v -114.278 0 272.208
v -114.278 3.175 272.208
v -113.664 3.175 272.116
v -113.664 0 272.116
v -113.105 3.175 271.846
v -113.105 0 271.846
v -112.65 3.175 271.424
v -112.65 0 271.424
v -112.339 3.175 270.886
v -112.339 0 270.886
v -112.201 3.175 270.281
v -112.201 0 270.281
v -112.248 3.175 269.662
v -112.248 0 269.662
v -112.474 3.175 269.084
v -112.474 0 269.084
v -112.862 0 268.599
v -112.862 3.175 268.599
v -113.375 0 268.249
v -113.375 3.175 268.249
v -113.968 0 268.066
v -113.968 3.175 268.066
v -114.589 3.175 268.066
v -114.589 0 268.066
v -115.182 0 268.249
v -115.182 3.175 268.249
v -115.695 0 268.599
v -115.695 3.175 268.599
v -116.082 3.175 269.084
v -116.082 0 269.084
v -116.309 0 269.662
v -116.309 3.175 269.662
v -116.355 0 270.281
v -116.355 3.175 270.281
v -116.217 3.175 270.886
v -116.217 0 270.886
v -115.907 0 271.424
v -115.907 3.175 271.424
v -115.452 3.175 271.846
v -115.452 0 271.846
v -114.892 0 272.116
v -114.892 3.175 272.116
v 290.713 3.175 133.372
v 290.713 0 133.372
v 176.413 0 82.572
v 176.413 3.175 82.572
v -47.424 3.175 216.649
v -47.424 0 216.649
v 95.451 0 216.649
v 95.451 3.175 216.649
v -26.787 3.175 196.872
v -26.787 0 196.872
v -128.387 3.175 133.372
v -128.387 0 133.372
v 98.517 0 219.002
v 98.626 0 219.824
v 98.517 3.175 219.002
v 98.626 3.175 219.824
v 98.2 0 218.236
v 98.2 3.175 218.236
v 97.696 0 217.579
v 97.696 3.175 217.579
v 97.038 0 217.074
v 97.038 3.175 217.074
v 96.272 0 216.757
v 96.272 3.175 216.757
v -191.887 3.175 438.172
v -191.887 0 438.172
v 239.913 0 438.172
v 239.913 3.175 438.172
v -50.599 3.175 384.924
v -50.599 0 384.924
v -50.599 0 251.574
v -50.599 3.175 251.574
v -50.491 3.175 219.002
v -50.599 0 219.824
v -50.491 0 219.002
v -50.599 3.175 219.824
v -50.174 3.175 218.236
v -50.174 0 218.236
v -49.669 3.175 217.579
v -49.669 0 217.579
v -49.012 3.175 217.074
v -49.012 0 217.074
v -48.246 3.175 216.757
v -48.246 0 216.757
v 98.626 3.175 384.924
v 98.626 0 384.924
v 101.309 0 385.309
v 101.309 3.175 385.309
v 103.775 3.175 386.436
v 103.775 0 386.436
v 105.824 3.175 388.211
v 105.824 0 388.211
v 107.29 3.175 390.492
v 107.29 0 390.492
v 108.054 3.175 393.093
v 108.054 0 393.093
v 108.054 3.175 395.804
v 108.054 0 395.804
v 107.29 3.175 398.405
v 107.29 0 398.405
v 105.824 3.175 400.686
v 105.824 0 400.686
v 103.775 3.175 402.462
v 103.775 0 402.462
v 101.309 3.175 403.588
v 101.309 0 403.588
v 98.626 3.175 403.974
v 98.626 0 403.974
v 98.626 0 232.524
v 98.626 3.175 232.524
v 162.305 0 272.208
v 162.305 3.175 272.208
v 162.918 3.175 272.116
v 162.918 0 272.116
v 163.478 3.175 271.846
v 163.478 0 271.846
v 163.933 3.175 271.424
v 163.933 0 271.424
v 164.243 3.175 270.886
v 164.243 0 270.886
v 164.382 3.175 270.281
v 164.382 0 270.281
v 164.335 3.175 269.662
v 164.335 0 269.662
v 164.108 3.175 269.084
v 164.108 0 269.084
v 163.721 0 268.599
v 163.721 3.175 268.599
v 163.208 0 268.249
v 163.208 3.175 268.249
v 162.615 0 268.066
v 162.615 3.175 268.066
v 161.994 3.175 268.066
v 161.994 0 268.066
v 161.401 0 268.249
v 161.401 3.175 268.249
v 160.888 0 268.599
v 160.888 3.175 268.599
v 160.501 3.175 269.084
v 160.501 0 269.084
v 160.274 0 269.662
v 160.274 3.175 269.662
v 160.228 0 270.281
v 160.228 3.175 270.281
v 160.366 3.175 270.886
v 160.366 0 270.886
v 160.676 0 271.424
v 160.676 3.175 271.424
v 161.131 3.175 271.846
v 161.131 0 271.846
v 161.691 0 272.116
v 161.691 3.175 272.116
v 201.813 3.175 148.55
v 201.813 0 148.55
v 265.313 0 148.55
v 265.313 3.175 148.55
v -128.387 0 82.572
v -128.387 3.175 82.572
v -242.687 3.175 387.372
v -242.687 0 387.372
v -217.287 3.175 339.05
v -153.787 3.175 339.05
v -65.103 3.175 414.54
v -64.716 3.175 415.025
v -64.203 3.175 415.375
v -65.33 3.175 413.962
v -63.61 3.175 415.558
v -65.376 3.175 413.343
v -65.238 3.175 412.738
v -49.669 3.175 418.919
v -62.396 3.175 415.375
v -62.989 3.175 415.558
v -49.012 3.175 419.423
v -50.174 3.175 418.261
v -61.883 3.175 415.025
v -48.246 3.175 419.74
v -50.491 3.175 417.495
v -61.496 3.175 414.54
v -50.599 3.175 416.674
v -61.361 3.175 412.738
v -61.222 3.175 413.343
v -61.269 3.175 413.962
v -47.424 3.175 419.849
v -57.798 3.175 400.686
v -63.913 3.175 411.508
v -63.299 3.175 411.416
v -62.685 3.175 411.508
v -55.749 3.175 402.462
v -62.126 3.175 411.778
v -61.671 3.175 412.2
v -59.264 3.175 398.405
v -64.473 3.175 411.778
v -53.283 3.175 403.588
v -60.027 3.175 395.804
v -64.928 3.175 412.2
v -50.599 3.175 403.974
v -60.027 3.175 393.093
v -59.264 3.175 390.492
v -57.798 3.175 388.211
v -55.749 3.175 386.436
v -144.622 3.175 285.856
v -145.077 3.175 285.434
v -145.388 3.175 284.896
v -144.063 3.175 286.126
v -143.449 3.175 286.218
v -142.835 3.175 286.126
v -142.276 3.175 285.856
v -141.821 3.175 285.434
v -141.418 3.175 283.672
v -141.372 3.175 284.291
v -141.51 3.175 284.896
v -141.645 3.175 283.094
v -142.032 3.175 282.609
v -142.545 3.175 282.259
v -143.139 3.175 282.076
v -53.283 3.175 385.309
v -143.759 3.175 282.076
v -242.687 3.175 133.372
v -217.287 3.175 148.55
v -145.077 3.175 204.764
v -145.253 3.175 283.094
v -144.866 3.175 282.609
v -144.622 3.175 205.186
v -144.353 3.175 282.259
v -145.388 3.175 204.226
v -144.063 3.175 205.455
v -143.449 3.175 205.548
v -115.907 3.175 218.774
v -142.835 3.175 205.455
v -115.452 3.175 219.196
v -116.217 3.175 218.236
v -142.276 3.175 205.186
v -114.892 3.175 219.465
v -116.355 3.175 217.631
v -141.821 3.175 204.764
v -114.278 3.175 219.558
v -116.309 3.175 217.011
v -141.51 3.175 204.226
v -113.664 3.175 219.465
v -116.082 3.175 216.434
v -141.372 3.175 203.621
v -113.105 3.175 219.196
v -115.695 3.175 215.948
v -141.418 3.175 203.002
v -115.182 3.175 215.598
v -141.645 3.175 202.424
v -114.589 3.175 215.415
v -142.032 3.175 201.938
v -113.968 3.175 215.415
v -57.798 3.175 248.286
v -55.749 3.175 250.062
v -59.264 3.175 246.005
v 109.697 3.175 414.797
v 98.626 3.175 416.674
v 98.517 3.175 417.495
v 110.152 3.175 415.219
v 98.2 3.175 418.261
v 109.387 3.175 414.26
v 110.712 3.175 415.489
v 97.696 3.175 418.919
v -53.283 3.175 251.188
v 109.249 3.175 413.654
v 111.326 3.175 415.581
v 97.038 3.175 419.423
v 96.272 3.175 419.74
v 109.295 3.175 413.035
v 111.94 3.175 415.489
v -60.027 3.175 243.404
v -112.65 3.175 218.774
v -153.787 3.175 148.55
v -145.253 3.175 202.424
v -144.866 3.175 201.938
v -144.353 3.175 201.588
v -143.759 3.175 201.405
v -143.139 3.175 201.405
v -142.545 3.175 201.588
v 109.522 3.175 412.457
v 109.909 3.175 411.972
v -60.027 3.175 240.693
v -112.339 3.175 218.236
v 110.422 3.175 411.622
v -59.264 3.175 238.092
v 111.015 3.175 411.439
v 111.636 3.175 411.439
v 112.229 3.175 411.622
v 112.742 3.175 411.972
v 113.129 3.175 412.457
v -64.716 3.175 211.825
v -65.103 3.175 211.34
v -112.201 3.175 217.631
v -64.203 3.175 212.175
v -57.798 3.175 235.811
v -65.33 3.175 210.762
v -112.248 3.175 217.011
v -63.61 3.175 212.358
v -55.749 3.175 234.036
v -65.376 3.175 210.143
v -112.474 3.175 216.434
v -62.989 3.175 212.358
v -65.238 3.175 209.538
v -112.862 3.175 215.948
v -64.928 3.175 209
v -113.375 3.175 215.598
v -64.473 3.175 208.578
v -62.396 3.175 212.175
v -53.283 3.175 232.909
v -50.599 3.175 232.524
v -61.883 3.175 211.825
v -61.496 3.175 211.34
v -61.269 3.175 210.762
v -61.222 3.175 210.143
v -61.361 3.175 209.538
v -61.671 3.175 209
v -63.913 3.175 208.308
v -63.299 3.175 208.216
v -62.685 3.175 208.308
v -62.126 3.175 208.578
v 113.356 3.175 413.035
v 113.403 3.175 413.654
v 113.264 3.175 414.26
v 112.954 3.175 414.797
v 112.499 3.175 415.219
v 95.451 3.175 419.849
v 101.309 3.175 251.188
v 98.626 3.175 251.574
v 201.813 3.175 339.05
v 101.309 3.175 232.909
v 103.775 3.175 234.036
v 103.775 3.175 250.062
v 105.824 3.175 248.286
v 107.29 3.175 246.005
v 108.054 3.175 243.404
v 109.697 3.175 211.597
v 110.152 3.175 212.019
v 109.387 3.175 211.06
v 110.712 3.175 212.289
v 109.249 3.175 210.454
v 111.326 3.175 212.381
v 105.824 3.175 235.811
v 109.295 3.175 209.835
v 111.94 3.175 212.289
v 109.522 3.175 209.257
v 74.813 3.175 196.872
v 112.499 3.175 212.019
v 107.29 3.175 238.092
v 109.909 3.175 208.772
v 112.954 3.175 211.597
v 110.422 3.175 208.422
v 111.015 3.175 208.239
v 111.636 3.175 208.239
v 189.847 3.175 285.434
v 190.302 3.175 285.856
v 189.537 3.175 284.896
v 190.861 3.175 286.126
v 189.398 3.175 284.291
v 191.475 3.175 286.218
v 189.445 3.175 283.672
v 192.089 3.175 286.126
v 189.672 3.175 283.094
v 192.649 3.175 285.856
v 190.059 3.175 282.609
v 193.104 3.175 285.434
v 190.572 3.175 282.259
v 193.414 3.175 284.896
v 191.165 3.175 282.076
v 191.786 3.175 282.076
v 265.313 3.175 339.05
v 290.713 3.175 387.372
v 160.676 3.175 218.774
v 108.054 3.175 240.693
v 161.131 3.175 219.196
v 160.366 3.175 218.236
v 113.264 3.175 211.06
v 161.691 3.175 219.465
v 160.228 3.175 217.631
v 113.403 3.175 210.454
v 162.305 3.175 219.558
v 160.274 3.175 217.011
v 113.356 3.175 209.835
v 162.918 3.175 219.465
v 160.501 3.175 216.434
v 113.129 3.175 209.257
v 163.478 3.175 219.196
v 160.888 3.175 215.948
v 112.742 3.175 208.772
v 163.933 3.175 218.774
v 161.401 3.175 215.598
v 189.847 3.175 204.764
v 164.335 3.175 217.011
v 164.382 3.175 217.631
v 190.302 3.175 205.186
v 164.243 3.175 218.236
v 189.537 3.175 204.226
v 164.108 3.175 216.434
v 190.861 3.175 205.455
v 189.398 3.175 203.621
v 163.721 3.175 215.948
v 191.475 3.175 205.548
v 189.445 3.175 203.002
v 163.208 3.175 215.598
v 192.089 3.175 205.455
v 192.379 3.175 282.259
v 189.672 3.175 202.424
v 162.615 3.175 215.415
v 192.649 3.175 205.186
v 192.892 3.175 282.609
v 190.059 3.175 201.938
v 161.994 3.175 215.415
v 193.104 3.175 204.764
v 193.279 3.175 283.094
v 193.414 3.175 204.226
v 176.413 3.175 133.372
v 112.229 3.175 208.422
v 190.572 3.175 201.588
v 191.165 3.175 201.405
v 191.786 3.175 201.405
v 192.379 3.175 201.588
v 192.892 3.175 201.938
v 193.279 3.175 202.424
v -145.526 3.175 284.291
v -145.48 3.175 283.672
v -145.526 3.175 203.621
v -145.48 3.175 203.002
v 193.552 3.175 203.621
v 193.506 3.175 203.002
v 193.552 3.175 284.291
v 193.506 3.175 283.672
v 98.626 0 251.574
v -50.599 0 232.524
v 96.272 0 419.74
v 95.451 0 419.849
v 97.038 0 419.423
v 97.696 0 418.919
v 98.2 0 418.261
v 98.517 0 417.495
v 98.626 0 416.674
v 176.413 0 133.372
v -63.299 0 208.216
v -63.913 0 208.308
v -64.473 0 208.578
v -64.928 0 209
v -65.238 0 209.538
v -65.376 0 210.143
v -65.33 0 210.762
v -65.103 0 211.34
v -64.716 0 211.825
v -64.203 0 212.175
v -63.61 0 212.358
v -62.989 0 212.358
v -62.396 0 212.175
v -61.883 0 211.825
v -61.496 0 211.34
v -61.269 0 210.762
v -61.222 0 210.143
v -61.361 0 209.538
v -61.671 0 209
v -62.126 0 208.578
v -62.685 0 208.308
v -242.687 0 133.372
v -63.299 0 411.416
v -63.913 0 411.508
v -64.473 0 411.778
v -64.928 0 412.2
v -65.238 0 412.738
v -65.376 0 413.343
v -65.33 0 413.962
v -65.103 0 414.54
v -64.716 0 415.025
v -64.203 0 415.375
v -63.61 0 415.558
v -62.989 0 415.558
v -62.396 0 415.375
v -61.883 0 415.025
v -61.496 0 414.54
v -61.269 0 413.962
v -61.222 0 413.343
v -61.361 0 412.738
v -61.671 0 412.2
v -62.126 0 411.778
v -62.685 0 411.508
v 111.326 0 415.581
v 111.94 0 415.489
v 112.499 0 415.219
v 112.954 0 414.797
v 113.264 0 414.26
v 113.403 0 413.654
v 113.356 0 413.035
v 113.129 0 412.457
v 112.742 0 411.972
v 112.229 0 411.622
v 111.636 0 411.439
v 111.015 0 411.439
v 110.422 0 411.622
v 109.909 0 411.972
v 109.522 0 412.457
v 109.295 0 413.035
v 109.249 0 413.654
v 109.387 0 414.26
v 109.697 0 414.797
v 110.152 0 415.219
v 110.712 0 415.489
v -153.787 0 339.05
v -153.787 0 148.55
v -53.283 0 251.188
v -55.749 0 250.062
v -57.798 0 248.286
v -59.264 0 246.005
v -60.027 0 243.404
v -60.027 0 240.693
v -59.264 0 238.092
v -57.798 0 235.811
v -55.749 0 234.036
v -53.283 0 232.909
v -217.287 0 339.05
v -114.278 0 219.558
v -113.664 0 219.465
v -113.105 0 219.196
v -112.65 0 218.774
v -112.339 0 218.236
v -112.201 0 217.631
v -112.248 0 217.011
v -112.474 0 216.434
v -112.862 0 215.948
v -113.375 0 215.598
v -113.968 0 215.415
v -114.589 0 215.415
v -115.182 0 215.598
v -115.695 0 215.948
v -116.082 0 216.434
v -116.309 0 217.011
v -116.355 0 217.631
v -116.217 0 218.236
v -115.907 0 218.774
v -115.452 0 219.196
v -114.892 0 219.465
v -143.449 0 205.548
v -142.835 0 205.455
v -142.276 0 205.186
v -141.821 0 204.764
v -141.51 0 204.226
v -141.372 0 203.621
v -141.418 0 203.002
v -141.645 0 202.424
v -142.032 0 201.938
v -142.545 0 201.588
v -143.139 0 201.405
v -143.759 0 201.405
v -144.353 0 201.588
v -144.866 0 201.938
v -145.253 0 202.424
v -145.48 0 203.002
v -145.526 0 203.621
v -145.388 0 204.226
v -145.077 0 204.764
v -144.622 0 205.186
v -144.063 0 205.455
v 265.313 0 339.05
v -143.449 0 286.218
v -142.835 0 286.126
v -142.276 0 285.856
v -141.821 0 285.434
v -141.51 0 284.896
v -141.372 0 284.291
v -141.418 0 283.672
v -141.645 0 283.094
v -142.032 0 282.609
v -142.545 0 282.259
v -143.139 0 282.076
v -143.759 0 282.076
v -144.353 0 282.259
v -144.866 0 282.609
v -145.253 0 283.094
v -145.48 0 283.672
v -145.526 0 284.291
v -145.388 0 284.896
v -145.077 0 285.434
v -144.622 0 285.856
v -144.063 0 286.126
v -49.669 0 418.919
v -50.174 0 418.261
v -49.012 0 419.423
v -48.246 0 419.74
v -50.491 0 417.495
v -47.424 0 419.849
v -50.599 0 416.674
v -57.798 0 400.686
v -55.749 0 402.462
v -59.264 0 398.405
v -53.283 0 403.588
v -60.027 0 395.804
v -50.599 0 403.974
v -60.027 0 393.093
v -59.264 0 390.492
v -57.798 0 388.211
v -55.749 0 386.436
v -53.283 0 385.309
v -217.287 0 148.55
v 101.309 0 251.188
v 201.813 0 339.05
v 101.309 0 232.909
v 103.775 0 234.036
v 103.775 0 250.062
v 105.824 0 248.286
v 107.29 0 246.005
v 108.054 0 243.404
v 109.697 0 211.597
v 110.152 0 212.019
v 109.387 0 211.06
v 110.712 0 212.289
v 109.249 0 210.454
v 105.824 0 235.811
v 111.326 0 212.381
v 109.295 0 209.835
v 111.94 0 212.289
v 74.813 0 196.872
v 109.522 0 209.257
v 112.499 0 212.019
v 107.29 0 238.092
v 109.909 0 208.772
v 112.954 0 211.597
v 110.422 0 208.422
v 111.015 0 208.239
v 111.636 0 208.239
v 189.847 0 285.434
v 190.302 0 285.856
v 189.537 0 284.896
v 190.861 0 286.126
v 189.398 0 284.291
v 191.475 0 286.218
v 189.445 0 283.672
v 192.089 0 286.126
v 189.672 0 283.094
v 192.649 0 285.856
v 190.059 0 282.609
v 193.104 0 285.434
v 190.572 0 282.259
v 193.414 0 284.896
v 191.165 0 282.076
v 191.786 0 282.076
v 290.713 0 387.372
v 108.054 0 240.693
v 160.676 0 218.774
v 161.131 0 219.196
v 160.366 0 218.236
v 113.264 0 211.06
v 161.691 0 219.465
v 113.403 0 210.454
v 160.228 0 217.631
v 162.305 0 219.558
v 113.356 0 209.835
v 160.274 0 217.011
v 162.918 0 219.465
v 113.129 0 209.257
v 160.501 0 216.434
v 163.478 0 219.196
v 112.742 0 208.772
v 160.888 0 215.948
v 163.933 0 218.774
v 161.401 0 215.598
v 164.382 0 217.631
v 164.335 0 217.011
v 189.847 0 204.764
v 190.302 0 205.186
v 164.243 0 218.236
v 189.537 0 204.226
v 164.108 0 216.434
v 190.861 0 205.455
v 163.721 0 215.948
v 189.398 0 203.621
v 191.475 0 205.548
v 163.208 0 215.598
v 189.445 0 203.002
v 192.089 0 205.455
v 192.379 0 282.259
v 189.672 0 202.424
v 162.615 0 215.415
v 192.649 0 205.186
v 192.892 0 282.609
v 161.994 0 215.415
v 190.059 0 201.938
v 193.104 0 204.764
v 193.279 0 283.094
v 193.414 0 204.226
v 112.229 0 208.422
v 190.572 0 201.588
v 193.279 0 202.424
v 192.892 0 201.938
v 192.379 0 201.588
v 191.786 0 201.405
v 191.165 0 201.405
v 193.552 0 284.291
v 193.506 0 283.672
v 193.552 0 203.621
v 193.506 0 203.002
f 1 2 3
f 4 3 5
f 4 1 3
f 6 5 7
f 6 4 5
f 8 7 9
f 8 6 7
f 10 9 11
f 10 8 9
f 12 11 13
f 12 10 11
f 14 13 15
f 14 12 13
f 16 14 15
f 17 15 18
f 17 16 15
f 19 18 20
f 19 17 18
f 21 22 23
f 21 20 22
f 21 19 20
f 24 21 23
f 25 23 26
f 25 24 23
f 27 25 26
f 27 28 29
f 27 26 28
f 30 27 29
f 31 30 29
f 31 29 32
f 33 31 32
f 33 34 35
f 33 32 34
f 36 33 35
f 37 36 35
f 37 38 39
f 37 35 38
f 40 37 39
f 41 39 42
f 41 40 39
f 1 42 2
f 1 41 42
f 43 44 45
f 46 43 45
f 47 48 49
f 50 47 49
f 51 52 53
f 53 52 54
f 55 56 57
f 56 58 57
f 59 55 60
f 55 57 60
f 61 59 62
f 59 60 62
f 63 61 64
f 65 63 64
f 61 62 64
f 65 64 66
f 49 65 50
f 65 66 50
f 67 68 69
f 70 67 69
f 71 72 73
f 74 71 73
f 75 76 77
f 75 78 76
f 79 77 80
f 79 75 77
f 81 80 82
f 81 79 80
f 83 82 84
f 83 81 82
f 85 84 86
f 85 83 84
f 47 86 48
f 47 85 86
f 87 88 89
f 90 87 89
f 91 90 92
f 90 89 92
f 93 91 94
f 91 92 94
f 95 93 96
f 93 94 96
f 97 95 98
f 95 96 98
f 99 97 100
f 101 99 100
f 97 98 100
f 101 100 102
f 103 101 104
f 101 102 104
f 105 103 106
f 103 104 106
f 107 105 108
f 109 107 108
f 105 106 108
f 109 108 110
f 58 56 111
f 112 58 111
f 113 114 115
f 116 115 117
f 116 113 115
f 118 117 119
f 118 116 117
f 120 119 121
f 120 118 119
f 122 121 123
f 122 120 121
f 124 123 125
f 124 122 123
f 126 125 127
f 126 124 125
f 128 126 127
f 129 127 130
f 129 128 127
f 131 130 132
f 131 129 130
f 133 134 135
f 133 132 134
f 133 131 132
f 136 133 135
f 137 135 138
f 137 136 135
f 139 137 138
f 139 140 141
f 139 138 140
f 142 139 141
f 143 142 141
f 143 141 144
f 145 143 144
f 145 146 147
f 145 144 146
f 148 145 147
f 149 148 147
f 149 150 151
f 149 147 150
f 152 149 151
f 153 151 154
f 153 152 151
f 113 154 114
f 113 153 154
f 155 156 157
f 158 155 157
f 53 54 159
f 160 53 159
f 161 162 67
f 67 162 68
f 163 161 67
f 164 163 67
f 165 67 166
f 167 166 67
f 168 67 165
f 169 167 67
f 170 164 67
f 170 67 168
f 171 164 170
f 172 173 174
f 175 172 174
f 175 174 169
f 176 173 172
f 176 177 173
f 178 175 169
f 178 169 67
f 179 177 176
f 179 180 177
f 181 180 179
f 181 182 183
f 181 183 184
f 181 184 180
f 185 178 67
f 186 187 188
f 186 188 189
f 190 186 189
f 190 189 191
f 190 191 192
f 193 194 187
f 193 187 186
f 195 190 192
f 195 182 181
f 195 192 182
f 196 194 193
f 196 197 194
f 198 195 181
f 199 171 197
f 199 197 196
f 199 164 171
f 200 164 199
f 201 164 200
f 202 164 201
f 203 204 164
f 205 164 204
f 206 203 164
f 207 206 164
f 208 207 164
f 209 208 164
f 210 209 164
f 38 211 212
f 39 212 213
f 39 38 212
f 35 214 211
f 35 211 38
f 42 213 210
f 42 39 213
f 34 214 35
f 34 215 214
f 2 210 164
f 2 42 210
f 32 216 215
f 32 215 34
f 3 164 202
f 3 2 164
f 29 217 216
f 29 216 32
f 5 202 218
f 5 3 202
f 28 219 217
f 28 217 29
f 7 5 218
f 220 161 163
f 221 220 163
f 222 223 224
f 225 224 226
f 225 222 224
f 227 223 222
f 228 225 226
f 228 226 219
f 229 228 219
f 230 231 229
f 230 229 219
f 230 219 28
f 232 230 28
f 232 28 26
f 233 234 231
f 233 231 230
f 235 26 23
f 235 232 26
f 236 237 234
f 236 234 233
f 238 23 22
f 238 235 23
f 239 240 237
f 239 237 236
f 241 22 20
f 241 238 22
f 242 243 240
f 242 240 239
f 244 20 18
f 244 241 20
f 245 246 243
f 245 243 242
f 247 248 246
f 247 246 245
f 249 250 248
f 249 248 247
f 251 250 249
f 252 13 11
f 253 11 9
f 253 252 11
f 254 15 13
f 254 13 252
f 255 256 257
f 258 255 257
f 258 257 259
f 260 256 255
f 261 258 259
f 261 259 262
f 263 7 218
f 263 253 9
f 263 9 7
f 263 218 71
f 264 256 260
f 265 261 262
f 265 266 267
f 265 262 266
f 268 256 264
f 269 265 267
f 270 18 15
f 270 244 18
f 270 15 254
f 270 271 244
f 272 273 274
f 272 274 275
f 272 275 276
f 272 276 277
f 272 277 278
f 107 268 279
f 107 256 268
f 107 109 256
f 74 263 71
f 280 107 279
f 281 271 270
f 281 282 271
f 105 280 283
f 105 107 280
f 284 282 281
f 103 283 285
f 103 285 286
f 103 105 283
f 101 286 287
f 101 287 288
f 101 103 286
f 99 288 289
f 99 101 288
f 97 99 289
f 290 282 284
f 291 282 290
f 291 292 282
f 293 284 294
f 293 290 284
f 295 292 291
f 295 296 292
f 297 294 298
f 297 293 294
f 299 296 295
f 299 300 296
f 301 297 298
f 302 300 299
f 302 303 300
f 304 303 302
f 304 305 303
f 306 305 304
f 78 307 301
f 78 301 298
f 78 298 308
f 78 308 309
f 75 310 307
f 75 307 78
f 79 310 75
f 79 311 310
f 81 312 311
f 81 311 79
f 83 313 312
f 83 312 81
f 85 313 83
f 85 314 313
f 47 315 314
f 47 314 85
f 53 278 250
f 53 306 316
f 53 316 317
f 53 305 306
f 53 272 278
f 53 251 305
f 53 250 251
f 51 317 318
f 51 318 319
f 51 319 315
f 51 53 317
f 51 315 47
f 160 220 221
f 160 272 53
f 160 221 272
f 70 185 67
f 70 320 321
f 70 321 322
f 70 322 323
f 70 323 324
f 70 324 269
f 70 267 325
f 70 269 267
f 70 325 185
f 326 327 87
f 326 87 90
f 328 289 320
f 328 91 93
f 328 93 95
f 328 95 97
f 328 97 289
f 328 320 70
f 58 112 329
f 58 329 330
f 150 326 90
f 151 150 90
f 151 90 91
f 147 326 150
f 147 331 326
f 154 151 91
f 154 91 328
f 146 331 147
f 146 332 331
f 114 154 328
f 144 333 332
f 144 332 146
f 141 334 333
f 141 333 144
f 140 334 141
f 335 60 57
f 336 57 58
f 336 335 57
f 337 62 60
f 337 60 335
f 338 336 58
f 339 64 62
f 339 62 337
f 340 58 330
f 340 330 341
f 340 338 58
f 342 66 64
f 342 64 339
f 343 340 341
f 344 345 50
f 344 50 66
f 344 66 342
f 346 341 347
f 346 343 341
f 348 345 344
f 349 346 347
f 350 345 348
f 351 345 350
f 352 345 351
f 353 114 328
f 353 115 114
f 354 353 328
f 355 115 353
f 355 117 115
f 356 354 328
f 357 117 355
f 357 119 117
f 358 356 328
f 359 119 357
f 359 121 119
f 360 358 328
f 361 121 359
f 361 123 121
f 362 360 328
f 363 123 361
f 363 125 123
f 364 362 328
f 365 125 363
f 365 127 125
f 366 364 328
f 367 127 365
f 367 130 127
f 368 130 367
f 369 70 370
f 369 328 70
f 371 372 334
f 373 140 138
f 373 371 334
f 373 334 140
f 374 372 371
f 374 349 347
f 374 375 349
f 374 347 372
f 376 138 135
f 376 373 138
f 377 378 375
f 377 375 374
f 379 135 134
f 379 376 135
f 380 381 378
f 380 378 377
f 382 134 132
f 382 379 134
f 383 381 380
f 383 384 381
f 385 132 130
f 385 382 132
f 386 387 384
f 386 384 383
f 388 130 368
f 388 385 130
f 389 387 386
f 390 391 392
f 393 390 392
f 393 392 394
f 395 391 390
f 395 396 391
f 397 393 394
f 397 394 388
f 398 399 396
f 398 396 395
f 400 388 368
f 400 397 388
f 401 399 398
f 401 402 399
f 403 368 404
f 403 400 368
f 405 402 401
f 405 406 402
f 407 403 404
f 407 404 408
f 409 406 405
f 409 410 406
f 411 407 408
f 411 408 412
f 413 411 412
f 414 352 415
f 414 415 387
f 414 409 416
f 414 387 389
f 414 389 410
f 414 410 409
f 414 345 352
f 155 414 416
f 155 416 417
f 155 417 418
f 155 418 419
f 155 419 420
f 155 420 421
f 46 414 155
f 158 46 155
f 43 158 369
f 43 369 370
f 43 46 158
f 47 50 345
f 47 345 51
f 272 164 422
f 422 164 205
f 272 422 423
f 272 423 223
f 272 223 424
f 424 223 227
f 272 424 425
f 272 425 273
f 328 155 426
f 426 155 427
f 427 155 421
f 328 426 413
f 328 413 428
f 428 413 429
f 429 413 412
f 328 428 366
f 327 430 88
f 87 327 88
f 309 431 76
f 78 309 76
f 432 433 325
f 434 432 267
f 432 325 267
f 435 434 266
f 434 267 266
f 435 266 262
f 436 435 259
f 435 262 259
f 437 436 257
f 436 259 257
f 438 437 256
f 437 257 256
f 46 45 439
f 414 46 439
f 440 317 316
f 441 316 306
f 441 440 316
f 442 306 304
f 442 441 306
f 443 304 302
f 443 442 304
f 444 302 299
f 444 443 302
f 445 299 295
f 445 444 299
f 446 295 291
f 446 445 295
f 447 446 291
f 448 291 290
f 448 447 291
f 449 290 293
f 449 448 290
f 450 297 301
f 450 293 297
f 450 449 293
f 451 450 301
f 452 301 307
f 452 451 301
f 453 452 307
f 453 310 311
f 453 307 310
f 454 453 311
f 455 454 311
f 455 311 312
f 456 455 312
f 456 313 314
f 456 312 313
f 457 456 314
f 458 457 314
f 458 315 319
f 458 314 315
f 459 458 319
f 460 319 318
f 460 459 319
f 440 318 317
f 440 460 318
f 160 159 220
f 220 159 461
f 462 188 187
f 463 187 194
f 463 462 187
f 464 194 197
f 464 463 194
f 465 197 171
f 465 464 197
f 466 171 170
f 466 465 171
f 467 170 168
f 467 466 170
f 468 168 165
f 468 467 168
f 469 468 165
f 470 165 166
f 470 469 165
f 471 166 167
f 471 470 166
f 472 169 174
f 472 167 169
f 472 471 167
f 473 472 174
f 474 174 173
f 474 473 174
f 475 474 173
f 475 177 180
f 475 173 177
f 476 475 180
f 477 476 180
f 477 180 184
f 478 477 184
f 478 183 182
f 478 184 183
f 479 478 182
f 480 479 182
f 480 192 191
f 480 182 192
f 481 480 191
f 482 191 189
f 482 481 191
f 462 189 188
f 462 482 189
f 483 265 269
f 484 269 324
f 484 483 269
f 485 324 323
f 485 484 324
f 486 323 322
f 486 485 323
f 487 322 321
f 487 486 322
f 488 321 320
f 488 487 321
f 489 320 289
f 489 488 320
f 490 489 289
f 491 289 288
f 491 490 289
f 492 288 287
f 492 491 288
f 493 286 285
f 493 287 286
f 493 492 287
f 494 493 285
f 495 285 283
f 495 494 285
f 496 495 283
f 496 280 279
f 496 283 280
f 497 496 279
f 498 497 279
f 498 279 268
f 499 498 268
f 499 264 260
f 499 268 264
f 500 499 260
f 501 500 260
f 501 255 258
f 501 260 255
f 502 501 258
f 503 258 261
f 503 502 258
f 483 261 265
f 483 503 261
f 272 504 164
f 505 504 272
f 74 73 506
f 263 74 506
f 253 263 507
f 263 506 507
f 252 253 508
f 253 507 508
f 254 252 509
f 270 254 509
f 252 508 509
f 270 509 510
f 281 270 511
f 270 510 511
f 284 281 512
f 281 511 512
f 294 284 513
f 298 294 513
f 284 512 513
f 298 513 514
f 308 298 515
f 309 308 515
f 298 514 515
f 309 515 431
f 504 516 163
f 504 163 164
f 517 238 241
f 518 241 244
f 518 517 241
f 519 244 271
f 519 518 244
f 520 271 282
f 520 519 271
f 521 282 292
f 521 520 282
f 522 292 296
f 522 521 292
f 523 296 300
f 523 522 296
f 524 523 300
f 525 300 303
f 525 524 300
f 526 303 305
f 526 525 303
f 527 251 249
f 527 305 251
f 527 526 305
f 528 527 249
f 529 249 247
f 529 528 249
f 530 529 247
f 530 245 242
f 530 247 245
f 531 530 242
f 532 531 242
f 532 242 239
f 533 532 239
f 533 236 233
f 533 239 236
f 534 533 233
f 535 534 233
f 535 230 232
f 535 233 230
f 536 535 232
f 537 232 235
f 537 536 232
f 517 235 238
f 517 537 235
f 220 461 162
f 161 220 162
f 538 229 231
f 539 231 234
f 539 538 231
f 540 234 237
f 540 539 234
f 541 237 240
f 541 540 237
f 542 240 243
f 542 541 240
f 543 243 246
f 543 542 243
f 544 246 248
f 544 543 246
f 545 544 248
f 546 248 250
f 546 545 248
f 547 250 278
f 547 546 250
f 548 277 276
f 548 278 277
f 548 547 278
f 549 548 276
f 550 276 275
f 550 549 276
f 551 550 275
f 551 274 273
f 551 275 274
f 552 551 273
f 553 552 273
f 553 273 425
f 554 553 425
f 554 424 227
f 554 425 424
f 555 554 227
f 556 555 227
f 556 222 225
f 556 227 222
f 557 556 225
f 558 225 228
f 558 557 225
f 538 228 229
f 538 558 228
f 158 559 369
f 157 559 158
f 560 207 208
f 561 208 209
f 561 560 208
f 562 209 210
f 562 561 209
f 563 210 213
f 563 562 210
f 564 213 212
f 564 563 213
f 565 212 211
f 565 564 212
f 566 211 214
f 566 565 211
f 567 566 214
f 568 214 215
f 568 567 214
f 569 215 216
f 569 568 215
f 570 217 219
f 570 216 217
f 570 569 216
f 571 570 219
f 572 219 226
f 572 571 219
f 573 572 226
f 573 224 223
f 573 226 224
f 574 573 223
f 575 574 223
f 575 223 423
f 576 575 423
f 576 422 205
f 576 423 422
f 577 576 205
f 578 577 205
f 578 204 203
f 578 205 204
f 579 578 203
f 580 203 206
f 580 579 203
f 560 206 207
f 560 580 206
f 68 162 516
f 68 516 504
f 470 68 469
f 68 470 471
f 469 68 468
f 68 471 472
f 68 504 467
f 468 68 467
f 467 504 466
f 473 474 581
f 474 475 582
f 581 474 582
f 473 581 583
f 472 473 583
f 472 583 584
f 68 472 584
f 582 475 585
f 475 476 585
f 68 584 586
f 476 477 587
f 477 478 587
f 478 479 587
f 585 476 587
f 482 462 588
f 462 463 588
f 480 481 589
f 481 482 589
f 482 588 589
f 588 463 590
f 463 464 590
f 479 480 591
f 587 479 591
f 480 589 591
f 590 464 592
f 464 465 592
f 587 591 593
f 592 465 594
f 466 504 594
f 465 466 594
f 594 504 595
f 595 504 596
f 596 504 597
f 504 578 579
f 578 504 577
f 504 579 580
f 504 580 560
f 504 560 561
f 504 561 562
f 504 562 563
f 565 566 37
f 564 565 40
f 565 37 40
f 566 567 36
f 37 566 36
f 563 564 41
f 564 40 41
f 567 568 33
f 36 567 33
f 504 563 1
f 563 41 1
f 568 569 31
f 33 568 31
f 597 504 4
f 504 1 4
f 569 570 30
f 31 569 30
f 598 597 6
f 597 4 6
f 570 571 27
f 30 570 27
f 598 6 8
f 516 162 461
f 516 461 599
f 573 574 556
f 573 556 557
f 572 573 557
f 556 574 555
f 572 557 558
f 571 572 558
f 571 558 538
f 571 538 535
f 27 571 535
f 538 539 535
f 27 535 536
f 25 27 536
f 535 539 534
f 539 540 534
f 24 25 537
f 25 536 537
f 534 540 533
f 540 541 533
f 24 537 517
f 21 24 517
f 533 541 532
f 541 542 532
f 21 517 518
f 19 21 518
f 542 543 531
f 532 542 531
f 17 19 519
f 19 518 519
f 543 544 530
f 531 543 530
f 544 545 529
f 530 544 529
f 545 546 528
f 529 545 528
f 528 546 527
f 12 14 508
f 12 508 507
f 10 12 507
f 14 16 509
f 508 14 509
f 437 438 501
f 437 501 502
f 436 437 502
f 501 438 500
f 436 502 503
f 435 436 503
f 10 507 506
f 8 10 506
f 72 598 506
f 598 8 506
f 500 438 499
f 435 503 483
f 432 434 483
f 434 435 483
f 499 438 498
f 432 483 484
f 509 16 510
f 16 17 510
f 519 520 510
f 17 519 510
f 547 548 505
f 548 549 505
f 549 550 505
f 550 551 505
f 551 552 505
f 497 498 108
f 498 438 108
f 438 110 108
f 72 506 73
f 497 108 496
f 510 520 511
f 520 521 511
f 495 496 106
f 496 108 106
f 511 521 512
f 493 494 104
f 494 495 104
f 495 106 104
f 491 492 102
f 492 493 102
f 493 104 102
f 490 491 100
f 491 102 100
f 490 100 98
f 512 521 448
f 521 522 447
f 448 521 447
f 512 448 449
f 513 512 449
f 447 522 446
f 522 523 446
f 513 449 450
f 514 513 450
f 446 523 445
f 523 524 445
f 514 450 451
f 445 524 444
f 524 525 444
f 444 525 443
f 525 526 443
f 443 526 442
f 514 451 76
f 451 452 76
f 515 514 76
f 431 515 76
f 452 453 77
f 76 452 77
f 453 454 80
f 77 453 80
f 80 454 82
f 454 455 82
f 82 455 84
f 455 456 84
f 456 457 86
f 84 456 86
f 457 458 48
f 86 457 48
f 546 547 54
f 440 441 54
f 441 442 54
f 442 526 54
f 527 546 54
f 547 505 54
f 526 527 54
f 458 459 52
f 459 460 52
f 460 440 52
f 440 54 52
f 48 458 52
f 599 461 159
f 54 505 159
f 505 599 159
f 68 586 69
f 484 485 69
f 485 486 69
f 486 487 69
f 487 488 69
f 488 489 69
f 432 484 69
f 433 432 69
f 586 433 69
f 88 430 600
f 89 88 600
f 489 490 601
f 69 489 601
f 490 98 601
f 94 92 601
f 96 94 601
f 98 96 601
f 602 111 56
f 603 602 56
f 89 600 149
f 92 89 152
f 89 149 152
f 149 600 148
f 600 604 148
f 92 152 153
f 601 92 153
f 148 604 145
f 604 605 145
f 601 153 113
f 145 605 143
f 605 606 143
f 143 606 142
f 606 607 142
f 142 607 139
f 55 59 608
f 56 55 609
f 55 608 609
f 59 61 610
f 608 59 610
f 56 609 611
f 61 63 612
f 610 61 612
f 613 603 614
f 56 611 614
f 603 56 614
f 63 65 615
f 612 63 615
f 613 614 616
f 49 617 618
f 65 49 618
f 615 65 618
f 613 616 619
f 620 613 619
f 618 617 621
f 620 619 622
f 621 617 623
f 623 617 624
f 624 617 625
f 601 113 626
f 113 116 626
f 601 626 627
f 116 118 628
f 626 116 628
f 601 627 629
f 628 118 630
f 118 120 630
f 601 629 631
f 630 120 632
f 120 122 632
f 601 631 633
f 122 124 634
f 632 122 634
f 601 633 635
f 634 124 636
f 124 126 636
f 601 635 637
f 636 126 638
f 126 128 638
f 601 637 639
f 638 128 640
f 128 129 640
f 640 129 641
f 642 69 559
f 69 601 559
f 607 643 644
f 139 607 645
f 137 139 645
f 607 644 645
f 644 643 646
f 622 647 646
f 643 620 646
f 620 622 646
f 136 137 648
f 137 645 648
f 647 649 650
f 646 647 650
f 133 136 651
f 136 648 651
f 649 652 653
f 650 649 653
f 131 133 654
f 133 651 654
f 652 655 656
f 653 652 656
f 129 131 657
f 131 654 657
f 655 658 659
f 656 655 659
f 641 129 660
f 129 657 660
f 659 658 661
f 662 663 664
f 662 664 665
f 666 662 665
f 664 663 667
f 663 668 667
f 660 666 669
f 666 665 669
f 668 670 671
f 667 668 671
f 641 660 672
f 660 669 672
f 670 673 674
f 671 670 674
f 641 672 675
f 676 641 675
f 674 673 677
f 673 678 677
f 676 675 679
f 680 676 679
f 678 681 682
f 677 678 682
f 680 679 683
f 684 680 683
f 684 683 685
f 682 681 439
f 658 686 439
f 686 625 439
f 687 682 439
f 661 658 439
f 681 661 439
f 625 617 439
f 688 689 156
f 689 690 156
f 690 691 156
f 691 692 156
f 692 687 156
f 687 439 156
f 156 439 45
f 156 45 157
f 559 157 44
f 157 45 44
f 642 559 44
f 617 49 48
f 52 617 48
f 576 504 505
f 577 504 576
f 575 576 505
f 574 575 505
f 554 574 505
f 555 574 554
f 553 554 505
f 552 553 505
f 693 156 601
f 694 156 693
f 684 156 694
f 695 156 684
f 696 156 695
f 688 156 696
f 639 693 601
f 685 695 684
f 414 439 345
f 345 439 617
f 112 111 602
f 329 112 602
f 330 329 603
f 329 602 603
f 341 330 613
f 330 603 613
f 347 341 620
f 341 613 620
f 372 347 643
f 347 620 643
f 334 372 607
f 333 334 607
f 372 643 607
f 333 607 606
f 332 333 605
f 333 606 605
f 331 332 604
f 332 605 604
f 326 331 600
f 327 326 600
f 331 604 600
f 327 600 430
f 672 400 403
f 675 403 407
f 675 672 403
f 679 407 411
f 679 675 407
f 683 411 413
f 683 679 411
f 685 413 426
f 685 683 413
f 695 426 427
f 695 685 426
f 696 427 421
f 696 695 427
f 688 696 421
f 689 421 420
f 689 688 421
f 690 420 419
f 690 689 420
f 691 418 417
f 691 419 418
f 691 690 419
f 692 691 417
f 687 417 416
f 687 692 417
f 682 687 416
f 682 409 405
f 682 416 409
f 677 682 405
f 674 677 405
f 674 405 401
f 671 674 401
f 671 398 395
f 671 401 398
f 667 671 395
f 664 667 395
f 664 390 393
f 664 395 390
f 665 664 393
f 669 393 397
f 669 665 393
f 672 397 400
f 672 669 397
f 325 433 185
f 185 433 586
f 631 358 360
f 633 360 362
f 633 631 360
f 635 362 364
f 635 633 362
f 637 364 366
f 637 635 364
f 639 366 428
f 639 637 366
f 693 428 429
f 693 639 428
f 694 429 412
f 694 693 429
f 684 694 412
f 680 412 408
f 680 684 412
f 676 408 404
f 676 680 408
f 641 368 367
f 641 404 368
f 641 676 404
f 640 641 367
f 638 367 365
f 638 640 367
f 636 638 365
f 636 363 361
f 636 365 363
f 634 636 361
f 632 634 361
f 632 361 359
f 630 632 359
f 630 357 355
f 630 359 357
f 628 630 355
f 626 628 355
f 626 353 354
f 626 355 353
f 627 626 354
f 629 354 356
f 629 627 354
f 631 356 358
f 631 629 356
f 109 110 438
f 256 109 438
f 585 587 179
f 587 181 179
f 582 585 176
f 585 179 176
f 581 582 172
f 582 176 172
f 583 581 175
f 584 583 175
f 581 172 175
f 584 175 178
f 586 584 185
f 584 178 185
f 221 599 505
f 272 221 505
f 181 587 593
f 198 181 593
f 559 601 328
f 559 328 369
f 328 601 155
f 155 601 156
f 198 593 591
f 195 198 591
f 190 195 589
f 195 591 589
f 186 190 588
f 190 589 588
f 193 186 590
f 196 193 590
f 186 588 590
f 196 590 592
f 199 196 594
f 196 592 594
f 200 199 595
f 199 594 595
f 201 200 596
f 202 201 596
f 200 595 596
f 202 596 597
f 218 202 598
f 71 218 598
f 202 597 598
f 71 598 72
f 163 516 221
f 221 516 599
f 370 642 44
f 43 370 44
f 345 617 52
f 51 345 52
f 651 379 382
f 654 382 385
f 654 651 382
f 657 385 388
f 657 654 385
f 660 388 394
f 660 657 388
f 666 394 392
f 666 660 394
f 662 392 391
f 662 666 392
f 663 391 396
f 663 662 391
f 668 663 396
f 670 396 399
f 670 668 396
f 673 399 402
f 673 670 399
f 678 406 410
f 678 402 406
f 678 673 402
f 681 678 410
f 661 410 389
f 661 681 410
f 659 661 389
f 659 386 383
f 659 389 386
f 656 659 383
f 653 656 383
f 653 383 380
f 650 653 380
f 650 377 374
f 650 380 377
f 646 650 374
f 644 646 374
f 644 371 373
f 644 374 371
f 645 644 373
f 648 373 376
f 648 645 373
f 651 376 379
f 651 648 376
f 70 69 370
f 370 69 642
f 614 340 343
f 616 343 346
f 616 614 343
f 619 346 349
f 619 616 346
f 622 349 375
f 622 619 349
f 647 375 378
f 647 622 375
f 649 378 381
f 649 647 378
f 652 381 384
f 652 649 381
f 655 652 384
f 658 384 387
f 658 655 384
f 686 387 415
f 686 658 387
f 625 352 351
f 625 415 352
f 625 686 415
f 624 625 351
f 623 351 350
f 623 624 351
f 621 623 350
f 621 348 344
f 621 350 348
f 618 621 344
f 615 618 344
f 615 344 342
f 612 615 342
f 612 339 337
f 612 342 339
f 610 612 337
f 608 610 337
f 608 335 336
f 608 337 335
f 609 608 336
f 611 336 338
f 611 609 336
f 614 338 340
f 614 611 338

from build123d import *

# Parameters (mm, degrees)
SKETCH1_W           = 63.5
SKETCH1_H           = 190.5
BOSS_EXTRUDE1_DEPTH = 3.175
SKETCH3_R           = 2.0828
CUT_EXTRUDE2_DEPTH  = 526.850378691
SKETCH4_R           = 2.0828
CUT_EXTRUDE4_DEPTH  = 526.850378691
FILLET2_R           = 3.175


with BuildPart() as part:
    # Sketch1 → Boss-Extrude1 (new body)
    with BuildSketch(Plane(origin=(0, 0, 0), x_dir=(1, 0, 0), z_dir=(0, 1, 0))):
        Polygon((-242.686835374, -133.432512515), (-242.686835374, -385.491221995), (-242.686835374, -387.371651362), (-191.886835374, -438.171651362), (239.913164626, -438.171651362), (290.713164626, -387.371651362), (290.713164626, -133.371651362), (176.413164626, -82.571651362), (176.413164626, -133.371651362), (74.813164626, -196.871651362), (-26.786835374, -196.871651362), (-128.386835374, -133.371651362), (-128.386835374, -82.571651362), (-242.686835374, -133.371651362), align=None)
        with Locations((233.563164626, -243.80020948)):
            Rectangle(SKETCH1_W, SKETCH1_H, mode=Mode.SUBTRACT)
        with Locations((-185.536835374, -243.80020948)):
            Rectangle(SKETCH1_W, SKETCH1_H, mode=Mode.SUBTRACT)
    extrude(amount=BOSS_EXTRUDE1_DEPTH)

    # Sketch3 → Cut-Extrude2 (cut, through all)
    with BuildSketch(Plane(origin=(0, 0, 0), x_dir=(1, 0, 0), z_dir=(0, 1, 0))):
        with Locations(Location((-114.278235374, -270.125471314, 0), (0, 0, 270))):
            Circle(SKETCH3_R)
        with Locations(Location((-143.449035374, -284.13540948, 0), (0, 0, 270))):
            Circle(SKETCH3_R)
        with Locations(Location((-114.278235374, -217.474947647, 0), (0, 0, 270))):
            Circle(SKETCH3_R)
        with Locations(Location((-143.449035374, -203.46500948, 0), (0, 0, 270))):
            Circle(SKETCH3_R)
        with Locations(Location((191.475364626, -284.13540948, 0), (0, 0, 270))):
            Circle(SKETCH3_R)
        with Locations(Location((162.304564626, -270.125471314, 0), (0, 0, 270))):
            Circle(SKETCH3_R)
        with Locations(Location((162.304564626, -217.474947647, 0), (0, 0, 270))):
            Circle(SKETCH3_R)
        with Locations(Location((191.475364626, -203.46500948, 0), (0, 0, 270))):
            Circle(SKETCH3_R)
    extrude(amount=CUT_EXTRUDE2_DEPTH, mode=Mode.SUBTRACT)

    # Sketch4 → Cut-Extrude4 (cut, through all)
    with BuildSketch(Plane(origin=(0, 0, 0), x_dir=(1, 0, 0), z_dir=(0, 1, 0))):
        with Locations(Location((111.325664626, -210.298576853, 0), (0, 0, 270))):
            Circle(SKETCH4_R)
        with Locations(Location((111.325664626, -413.498576853, 0), (0, 0, 270))):
            Circle(SKETCH4_R)
        with Locations(Location((-63.299335374, -413.498576853, 0), (0, 0, 90))):
            Circle(SKETCH4_R)
        with Locations(Location((-63.299335374, -210.298576853, 0), (0, 0, 90))):
            Circle(SKETCH4_R)
        with BuildLine():
            Line((-50.599335374, -216.648576853), (98.625664626, -216.648576853))
            Line((98.625664626, -216.648576853), (98.625664626, -232.523576853))
            ThreePointArc((98.625664626, -232.523576853), (108.150664626, -242.048576853), (98.625664626, -251.573576853))
            Line((98.625664626, -251.573576853), (98.625664626, -384.923576853))
            ThreePointArc((98.625664626, -384.923576853), (108.150664626, -394.448576853), (98.625664626, -403.973576853))
            Line((98.625664626, -403.973576853), (98.625664626, -419.848576853))
            Line((98.625664626, -419.848576853), (-50.599335374, -419.848576853))
            Line((-50.599335374, -419.848576853), (-50.599335374, -403.973576853))
            ThreePointArc((-50.599335374, -403.973576853), (-60.124335374, -394.448576853), (-50.599335374, -384.923576853))
            Line((-50.599335374, -384.923576853), (-50.599335374, -251.573576853))
            ThreePointArc((-50.599335374, -251.573576853), (-60.124335374, -242.048576853), (-50.599335374, -232.523576853))
            Line((-50.599335374, -232.523576853), (-50.599335374, -216.648576853))
        make_face()
    extrude(amount=CUT_EXTRUDE4_DEPTH, mode=Mode.SUBTRACT)

    # Fillet2
    fillet2_edges = [part.edges().sort_by_distance(p)[0] for p in [
        (98.625664626, 1.5875, 419.848576853),
        (98.625664626, 1.5875, 216.648576853),
        (-50.599335374, 1.5875, 216.648576853),
        (-50.599335374, 1.5875, 419.848576853),
    ]]
    fillet(fillet2_edges, radius=FILLET2_R)


solid = part.part
